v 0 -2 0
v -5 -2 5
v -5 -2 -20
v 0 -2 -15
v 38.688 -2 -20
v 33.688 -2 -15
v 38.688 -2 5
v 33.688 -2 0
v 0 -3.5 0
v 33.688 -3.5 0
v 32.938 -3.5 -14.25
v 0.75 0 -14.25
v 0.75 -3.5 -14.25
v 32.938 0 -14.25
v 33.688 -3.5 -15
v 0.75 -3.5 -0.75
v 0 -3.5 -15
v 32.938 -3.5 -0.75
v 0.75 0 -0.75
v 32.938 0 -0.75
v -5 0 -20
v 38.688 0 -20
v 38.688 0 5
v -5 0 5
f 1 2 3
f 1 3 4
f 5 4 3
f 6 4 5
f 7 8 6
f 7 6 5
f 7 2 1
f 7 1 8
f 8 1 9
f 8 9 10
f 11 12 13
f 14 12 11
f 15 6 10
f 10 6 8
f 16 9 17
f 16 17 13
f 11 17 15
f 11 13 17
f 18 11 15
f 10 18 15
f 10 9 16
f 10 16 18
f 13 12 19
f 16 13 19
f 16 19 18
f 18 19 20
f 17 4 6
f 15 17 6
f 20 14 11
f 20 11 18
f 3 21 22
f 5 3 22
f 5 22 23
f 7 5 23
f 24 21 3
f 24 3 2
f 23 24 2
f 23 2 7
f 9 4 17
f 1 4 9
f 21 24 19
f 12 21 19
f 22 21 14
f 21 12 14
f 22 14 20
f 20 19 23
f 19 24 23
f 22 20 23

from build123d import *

# Parameters (mm, degrees)
F0_W     = 33.688
F0_H     = 15
F0_W_2   = 32.188
F0_H_2   = 13.5
F1_DEPTH = 3.5
F0_W_3   = 43.688
F0_H_3   = 25
F2_DEPTH = 2


with BuildPart() as f1:
    # F0 (on Front) → F1 (new body)
    with BuildSketch(Plane.XZ):
        with Locations((16.844, -7.5)):
            Rectangle(F0_W, F0_H)
        with Locations((16.844, -7.5)):
            Rectangle(F0_W_2, F0_H_2, mode=Mode.SUBTRACT)
    extrude(amount=F1_DEPTH)

    # F0 (on Front) → F2 (join)
    with BuildSketch(Plane.XZ):
        with Locations((16.844, -7.5)):
            Rectangle(F0_W_3, F0_H_3)
        with Locations((16.844, -7.5)):
            Rectangle(F0_W, F0_H, mode=Mode.SUBTRACT)
    extrude(amount=F2_DEPTH)


solid = f1.part
